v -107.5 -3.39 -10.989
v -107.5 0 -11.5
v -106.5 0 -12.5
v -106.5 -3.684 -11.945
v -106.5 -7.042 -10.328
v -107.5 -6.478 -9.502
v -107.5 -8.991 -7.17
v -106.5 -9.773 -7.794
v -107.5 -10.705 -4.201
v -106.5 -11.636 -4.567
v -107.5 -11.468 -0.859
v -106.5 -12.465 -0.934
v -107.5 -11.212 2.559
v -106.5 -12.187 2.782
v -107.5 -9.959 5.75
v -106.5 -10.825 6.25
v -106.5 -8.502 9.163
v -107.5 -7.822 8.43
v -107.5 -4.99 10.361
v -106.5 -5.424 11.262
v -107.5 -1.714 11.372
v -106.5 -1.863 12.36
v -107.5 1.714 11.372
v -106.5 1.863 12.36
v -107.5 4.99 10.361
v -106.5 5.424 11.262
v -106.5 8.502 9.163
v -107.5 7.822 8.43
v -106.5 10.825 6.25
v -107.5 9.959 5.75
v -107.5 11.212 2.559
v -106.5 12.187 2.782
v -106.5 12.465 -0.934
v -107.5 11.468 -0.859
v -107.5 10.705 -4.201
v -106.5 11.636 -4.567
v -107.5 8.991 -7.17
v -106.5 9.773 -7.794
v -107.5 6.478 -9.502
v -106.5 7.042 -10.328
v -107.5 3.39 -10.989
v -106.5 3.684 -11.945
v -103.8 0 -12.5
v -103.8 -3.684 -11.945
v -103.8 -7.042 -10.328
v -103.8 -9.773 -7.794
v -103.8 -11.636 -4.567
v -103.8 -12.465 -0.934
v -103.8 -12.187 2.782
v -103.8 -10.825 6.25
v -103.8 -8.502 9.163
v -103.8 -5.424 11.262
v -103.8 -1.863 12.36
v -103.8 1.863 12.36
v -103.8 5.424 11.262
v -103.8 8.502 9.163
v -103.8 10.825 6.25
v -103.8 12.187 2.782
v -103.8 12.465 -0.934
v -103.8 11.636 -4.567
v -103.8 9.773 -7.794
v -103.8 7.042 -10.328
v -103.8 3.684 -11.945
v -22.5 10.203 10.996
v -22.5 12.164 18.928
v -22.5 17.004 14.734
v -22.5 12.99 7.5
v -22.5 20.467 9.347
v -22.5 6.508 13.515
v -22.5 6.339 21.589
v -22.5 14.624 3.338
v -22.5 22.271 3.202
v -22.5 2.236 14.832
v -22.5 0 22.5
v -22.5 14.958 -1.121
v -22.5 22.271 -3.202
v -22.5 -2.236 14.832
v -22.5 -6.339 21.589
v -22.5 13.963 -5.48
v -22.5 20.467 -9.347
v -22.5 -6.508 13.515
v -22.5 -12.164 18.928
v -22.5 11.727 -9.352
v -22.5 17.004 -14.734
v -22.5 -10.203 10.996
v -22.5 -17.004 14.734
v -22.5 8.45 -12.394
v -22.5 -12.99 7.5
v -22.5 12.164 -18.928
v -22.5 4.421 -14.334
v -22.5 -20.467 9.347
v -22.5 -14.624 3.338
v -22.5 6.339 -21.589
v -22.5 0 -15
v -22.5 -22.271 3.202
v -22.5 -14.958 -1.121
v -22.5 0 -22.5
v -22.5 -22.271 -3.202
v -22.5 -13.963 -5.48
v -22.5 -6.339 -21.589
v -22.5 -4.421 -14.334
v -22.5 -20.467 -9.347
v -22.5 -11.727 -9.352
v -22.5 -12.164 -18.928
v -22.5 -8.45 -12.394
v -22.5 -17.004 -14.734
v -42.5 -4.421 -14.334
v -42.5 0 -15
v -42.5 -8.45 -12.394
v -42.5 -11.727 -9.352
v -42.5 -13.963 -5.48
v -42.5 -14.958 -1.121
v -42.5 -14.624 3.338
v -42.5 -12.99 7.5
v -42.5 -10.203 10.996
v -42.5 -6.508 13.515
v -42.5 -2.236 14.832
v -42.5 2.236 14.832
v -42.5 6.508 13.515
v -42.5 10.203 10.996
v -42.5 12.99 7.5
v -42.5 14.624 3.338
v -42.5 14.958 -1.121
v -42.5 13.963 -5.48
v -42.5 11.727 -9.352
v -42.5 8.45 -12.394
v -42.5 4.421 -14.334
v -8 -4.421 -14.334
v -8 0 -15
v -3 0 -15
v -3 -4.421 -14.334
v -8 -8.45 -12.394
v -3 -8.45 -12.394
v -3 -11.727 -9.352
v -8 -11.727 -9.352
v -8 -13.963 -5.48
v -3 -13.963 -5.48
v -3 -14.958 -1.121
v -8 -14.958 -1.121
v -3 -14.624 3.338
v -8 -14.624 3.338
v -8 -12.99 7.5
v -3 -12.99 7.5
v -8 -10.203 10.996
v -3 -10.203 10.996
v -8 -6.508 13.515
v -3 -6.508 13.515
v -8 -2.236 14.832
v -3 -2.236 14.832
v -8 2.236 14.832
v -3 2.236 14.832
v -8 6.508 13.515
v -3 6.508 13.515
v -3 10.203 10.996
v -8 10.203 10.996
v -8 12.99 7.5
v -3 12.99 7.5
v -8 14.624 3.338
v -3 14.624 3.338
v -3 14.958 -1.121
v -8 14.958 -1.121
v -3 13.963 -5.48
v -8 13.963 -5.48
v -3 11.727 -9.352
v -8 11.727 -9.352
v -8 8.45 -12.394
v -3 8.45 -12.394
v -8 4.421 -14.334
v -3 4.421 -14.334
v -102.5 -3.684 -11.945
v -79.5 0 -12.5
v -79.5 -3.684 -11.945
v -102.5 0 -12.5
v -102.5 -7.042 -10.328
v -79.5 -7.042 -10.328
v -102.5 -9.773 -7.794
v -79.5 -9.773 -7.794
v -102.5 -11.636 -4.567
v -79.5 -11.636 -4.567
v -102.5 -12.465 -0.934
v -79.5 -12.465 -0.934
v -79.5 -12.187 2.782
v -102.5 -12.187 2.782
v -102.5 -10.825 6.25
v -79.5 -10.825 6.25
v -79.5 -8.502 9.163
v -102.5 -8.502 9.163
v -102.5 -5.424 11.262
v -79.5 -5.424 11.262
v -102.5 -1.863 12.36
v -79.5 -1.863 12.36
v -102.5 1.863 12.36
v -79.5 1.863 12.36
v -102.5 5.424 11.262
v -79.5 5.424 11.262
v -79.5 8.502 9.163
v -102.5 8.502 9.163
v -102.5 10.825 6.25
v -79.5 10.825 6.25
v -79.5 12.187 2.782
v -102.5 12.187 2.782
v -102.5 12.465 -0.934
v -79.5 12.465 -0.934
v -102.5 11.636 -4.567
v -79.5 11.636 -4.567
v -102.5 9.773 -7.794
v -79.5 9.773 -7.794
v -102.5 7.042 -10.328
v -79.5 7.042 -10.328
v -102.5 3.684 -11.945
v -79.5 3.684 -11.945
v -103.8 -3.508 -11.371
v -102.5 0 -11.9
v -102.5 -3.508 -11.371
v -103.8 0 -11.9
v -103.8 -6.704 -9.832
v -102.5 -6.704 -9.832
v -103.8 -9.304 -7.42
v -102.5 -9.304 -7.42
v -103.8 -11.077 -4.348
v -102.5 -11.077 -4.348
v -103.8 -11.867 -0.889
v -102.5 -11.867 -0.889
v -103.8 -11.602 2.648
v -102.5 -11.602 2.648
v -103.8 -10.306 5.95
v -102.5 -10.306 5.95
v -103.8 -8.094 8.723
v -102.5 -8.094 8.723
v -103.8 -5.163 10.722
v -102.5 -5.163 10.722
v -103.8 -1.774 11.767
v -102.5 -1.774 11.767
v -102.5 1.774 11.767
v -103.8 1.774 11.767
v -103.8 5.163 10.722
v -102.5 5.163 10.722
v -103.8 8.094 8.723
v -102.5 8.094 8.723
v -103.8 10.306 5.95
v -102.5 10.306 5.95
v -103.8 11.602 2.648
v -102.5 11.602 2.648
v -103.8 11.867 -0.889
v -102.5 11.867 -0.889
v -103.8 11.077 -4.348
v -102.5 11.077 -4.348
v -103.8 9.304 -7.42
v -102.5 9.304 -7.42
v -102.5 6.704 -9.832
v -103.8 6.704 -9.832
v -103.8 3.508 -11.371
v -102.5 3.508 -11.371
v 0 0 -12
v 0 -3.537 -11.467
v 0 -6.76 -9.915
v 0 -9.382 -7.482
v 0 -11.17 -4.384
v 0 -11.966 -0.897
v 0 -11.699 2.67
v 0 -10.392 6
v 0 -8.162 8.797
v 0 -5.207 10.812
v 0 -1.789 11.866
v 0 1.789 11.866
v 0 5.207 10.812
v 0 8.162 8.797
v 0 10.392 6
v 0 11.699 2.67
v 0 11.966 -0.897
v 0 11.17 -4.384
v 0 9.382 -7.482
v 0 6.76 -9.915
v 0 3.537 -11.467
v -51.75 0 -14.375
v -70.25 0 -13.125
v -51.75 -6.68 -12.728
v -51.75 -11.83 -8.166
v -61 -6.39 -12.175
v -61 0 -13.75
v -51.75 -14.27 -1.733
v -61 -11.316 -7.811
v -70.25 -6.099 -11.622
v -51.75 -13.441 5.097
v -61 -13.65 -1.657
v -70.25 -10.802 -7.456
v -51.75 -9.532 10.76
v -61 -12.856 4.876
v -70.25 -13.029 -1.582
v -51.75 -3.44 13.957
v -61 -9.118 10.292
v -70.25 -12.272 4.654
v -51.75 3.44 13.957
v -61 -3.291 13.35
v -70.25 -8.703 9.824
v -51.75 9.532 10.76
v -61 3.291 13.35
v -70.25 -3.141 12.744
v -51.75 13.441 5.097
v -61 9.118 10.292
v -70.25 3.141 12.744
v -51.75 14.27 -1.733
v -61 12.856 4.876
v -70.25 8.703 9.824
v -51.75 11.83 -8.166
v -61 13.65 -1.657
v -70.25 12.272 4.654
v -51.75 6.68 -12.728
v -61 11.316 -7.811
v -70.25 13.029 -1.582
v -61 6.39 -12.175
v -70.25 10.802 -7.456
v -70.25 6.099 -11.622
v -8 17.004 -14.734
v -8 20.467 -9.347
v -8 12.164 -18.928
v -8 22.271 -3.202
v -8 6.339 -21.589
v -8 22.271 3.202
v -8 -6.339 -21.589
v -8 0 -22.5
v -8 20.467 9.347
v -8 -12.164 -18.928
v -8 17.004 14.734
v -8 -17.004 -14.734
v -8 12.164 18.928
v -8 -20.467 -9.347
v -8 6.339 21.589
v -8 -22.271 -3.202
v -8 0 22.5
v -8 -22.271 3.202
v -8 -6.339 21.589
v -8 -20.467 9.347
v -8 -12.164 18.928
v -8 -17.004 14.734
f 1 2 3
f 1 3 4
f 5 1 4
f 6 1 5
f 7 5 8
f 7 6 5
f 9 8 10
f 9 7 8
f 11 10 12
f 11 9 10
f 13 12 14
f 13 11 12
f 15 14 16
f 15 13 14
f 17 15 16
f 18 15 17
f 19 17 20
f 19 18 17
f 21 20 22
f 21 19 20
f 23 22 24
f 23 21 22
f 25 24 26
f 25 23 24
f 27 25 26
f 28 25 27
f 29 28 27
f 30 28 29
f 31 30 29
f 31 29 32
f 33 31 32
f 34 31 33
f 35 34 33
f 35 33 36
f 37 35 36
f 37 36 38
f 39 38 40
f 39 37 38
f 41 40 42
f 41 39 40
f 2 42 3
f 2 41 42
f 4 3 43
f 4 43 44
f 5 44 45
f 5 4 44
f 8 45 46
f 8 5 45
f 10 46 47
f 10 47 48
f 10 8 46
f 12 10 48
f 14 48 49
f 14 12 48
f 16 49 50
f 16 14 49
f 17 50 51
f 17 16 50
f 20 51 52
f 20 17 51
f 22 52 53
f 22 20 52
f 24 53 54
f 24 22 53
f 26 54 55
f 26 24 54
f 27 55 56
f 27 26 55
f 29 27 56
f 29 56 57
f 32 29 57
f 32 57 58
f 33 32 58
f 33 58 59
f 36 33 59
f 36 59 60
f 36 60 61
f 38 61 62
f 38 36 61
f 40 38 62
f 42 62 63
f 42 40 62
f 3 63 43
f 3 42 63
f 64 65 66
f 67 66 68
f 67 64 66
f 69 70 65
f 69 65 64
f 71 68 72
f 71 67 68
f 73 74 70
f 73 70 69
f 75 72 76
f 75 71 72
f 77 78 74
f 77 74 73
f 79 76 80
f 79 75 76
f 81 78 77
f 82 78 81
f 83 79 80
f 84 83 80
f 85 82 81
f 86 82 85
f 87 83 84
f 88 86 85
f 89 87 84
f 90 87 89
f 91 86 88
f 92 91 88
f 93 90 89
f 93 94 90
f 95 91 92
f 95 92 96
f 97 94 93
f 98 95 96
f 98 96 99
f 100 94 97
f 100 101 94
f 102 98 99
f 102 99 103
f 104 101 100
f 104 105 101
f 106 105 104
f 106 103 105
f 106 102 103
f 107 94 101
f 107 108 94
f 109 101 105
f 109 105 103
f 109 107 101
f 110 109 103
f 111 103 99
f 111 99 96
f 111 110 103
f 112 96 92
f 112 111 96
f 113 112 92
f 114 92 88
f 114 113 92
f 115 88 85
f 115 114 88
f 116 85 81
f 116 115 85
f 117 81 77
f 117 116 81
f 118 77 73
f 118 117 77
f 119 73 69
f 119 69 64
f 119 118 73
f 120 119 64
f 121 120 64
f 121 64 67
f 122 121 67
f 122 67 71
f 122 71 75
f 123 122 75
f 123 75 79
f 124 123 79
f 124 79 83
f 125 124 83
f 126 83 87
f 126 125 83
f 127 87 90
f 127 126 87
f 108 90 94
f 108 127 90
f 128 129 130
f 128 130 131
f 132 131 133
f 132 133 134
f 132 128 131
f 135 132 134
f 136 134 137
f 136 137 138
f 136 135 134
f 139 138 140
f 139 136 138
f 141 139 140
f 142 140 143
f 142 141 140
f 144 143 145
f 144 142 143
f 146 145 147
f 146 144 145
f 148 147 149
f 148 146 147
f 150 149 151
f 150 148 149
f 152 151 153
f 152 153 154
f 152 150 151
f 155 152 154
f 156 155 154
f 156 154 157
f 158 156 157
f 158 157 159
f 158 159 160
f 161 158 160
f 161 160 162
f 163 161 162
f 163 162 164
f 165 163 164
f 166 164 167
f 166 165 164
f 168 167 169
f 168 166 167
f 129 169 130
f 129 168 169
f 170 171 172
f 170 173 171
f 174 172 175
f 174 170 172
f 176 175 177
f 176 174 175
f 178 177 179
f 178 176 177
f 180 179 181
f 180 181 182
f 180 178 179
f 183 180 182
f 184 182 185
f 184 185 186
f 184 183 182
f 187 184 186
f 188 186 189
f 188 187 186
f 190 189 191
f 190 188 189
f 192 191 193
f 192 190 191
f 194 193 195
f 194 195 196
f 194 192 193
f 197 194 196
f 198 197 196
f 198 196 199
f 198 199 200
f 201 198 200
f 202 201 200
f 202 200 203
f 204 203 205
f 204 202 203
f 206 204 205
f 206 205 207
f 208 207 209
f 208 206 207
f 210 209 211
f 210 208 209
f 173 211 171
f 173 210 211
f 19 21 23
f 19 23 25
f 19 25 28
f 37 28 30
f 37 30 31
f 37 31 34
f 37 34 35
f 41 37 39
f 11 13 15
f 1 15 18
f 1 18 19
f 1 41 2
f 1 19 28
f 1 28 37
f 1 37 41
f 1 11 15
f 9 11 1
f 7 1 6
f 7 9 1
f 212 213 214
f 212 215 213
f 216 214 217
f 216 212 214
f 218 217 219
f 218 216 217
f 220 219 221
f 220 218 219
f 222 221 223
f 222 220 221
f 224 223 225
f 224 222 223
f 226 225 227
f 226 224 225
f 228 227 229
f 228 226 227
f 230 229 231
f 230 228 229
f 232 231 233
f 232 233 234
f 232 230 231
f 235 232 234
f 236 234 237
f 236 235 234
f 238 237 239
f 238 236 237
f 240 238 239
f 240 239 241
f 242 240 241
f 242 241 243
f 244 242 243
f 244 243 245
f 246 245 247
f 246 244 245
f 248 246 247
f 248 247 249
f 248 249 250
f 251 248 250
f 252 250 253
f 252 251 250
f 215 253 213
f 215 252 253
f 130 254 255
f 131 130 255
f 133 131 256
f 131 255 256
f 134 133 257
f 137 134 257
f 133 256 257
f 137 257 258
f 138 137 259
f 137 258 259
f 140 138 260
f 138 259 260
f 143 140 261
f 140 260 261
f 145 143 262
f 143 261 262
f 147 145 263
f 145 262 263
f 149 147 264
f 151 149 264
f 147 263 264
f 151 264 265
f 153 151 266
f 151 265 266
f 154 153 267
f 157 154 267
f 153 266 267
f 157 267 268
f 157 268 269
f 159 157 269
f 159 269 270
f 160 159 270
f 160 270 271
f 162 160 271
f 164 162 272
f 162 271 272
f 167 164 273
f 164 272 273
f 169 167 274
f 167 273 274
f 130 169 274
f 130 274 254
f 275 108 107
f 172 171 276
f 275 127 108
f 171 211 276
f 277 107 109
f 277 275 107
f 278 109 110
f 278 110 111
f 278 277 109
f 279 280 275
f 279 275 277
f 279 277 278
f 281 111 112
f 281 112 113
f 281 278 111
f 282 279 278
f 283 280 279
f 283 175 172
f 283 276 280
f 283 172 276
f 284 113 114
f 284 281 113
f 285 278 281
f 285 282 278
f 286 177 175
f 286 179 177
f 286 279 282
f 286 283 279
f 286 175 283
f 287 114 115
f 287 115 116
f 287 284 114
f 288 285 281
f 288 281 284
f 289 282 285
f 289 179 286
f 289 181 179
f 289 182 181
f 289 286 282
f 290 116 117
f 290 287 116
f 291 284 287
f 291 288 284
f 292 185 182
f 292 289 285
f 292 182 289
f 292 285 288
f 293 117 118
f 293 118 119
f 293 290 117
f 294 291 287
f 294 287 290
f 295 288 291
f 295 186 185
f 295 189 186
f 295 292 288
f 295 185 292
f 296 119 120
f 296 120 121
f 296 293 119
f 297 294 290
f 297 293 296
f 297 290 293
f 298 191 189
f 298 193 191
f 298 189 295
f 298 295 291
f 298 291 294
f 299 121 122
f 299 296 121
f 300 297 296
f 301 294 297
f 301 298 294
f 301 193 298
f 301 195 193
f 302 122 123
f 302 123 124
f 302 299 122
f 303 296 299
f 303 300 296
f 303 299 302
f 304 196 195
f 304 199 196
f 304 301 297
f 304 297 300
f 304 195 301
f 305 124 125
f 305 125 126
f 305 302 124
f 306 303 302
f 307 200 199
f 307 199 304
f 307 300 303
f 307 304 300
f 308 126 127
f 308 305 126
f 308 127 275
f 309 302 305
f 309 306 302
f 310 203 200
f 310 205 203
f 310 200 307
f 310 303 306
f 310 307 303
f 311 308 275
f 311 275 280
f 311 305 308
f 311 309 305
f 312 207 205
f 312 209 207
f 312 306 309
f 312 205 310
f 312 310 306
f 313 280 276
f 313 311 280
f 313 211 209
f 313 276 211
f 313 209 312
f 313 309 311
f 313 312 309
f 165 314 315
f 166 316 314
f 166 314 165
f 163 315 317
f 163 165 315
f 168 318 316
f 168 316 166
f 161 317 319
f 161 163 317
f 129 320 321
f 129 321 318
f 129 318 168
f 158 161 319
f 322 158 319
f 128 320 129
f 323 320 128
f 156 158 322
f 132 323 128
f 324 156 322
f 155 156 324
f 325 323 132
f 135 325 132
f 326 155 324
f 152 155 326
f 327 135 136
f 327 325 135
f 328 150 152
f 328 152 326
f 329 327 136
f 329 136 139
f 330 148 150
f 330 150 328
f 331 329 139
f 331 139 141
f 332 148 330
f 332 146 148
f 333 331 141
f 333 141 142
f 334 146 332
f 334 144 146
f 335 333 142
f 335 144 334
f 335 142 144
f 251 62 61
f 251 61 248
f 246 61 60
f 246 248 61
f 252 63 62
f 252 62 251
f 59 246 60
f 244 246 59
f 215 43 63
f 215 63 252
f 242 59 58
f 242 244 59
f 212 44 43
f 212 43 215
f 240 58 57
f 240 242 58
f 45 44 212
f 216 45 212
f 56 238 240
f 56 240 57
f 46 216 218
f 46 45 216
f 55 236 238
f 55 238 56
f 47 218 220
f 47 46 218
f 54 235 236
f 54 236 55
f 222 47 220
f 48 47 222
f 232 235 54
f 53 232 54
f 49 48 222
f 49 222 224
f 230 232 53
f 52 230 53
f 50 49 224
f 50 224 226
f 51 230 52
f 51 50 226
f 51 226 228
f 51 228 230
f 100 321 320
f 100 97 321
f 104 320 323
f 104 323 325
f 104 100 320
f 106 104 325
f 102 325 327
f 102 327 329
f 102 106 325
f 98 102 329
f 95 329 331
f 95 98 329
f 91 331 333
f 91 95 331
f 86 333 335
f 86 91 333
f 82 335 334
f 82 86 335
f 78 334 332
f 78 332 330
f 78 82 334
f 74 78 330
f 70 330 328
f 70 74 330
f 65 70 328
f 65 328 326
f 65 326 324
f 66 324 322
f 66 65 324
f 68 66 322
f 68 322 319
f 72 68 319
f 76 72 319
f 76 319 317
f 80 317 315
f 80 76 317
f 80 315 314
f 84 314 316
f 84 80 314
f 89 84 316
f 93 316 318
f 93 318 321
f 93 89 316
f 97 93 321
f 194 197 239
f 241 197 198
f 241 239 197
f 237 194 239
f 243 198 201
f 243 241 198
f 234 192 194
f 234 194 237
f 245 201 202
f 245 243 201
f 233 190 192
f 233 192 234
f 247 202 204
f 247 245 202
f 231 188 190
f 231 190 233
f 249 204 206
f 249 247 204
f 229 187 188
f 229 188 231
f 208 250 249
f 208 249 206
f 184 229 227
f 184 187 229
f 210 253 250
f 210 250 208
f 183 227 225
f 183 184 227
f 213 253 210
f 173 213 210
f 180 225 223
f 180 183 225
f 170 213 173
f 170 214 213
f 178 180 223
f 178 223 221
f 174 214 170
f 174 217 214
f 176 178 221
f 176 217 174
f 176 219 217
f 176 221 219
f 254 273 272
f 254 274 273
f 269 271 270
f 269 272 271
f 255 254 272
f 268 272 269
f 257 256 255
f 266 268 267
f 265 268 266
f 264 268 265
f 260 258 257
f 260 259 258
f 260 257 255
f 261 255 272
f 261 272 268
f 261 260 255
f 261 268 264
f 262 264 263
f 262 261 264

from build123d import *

# Parameters (mm, degrees)
CHANFREIN1_SIZE = 1
CHANFREIN2_SIZE = 3


with BuildPart() as part:
    # Esquisse1 → Révolution1 (revolve)
    with BuildSketch(Plane.XY, mode=Mode.PRIVATE) as r_volution1_sk:
        Polygon((0, 0), (0, 15), (-8, 15), (-8, 22.5), (-22.5, 22.5), (-22.5, 15), (-42.5, 15), (-79.5, 12.5), (-102.5, 12.5), (-102.5, 11.9), (-103.8, 11.9), (-103.8, 12.5), (-107.5, 12.5), (-107.5, 0), align=None)
    revolve(r_volution1_sk.sketch.rotate(Axis((0, 0, 0), (-1, 0, 0)), 90), axis=Axis((0, 0, 0), (-1, 0, 0)))  # turned: the seam where the file's is

    # Chanfrein1
    chanfrein1_edges = [part.edges().sort_by_distance(p)[0] for p in [
        (-107.5, 0, 12.5),
    ]]
    chamfer(chanfrein1_edges, length=CHANFREIN1_SIZE)

    # Chanfrein2
    chanfrein2_edges = [part.edges().sort_by_distance(p)[0] for p in [
        (0, 0, 15),
    ]]
    chamfer(chanfrein2_edges, length=CHANFREIN2_SIZE)


solid = part.part
